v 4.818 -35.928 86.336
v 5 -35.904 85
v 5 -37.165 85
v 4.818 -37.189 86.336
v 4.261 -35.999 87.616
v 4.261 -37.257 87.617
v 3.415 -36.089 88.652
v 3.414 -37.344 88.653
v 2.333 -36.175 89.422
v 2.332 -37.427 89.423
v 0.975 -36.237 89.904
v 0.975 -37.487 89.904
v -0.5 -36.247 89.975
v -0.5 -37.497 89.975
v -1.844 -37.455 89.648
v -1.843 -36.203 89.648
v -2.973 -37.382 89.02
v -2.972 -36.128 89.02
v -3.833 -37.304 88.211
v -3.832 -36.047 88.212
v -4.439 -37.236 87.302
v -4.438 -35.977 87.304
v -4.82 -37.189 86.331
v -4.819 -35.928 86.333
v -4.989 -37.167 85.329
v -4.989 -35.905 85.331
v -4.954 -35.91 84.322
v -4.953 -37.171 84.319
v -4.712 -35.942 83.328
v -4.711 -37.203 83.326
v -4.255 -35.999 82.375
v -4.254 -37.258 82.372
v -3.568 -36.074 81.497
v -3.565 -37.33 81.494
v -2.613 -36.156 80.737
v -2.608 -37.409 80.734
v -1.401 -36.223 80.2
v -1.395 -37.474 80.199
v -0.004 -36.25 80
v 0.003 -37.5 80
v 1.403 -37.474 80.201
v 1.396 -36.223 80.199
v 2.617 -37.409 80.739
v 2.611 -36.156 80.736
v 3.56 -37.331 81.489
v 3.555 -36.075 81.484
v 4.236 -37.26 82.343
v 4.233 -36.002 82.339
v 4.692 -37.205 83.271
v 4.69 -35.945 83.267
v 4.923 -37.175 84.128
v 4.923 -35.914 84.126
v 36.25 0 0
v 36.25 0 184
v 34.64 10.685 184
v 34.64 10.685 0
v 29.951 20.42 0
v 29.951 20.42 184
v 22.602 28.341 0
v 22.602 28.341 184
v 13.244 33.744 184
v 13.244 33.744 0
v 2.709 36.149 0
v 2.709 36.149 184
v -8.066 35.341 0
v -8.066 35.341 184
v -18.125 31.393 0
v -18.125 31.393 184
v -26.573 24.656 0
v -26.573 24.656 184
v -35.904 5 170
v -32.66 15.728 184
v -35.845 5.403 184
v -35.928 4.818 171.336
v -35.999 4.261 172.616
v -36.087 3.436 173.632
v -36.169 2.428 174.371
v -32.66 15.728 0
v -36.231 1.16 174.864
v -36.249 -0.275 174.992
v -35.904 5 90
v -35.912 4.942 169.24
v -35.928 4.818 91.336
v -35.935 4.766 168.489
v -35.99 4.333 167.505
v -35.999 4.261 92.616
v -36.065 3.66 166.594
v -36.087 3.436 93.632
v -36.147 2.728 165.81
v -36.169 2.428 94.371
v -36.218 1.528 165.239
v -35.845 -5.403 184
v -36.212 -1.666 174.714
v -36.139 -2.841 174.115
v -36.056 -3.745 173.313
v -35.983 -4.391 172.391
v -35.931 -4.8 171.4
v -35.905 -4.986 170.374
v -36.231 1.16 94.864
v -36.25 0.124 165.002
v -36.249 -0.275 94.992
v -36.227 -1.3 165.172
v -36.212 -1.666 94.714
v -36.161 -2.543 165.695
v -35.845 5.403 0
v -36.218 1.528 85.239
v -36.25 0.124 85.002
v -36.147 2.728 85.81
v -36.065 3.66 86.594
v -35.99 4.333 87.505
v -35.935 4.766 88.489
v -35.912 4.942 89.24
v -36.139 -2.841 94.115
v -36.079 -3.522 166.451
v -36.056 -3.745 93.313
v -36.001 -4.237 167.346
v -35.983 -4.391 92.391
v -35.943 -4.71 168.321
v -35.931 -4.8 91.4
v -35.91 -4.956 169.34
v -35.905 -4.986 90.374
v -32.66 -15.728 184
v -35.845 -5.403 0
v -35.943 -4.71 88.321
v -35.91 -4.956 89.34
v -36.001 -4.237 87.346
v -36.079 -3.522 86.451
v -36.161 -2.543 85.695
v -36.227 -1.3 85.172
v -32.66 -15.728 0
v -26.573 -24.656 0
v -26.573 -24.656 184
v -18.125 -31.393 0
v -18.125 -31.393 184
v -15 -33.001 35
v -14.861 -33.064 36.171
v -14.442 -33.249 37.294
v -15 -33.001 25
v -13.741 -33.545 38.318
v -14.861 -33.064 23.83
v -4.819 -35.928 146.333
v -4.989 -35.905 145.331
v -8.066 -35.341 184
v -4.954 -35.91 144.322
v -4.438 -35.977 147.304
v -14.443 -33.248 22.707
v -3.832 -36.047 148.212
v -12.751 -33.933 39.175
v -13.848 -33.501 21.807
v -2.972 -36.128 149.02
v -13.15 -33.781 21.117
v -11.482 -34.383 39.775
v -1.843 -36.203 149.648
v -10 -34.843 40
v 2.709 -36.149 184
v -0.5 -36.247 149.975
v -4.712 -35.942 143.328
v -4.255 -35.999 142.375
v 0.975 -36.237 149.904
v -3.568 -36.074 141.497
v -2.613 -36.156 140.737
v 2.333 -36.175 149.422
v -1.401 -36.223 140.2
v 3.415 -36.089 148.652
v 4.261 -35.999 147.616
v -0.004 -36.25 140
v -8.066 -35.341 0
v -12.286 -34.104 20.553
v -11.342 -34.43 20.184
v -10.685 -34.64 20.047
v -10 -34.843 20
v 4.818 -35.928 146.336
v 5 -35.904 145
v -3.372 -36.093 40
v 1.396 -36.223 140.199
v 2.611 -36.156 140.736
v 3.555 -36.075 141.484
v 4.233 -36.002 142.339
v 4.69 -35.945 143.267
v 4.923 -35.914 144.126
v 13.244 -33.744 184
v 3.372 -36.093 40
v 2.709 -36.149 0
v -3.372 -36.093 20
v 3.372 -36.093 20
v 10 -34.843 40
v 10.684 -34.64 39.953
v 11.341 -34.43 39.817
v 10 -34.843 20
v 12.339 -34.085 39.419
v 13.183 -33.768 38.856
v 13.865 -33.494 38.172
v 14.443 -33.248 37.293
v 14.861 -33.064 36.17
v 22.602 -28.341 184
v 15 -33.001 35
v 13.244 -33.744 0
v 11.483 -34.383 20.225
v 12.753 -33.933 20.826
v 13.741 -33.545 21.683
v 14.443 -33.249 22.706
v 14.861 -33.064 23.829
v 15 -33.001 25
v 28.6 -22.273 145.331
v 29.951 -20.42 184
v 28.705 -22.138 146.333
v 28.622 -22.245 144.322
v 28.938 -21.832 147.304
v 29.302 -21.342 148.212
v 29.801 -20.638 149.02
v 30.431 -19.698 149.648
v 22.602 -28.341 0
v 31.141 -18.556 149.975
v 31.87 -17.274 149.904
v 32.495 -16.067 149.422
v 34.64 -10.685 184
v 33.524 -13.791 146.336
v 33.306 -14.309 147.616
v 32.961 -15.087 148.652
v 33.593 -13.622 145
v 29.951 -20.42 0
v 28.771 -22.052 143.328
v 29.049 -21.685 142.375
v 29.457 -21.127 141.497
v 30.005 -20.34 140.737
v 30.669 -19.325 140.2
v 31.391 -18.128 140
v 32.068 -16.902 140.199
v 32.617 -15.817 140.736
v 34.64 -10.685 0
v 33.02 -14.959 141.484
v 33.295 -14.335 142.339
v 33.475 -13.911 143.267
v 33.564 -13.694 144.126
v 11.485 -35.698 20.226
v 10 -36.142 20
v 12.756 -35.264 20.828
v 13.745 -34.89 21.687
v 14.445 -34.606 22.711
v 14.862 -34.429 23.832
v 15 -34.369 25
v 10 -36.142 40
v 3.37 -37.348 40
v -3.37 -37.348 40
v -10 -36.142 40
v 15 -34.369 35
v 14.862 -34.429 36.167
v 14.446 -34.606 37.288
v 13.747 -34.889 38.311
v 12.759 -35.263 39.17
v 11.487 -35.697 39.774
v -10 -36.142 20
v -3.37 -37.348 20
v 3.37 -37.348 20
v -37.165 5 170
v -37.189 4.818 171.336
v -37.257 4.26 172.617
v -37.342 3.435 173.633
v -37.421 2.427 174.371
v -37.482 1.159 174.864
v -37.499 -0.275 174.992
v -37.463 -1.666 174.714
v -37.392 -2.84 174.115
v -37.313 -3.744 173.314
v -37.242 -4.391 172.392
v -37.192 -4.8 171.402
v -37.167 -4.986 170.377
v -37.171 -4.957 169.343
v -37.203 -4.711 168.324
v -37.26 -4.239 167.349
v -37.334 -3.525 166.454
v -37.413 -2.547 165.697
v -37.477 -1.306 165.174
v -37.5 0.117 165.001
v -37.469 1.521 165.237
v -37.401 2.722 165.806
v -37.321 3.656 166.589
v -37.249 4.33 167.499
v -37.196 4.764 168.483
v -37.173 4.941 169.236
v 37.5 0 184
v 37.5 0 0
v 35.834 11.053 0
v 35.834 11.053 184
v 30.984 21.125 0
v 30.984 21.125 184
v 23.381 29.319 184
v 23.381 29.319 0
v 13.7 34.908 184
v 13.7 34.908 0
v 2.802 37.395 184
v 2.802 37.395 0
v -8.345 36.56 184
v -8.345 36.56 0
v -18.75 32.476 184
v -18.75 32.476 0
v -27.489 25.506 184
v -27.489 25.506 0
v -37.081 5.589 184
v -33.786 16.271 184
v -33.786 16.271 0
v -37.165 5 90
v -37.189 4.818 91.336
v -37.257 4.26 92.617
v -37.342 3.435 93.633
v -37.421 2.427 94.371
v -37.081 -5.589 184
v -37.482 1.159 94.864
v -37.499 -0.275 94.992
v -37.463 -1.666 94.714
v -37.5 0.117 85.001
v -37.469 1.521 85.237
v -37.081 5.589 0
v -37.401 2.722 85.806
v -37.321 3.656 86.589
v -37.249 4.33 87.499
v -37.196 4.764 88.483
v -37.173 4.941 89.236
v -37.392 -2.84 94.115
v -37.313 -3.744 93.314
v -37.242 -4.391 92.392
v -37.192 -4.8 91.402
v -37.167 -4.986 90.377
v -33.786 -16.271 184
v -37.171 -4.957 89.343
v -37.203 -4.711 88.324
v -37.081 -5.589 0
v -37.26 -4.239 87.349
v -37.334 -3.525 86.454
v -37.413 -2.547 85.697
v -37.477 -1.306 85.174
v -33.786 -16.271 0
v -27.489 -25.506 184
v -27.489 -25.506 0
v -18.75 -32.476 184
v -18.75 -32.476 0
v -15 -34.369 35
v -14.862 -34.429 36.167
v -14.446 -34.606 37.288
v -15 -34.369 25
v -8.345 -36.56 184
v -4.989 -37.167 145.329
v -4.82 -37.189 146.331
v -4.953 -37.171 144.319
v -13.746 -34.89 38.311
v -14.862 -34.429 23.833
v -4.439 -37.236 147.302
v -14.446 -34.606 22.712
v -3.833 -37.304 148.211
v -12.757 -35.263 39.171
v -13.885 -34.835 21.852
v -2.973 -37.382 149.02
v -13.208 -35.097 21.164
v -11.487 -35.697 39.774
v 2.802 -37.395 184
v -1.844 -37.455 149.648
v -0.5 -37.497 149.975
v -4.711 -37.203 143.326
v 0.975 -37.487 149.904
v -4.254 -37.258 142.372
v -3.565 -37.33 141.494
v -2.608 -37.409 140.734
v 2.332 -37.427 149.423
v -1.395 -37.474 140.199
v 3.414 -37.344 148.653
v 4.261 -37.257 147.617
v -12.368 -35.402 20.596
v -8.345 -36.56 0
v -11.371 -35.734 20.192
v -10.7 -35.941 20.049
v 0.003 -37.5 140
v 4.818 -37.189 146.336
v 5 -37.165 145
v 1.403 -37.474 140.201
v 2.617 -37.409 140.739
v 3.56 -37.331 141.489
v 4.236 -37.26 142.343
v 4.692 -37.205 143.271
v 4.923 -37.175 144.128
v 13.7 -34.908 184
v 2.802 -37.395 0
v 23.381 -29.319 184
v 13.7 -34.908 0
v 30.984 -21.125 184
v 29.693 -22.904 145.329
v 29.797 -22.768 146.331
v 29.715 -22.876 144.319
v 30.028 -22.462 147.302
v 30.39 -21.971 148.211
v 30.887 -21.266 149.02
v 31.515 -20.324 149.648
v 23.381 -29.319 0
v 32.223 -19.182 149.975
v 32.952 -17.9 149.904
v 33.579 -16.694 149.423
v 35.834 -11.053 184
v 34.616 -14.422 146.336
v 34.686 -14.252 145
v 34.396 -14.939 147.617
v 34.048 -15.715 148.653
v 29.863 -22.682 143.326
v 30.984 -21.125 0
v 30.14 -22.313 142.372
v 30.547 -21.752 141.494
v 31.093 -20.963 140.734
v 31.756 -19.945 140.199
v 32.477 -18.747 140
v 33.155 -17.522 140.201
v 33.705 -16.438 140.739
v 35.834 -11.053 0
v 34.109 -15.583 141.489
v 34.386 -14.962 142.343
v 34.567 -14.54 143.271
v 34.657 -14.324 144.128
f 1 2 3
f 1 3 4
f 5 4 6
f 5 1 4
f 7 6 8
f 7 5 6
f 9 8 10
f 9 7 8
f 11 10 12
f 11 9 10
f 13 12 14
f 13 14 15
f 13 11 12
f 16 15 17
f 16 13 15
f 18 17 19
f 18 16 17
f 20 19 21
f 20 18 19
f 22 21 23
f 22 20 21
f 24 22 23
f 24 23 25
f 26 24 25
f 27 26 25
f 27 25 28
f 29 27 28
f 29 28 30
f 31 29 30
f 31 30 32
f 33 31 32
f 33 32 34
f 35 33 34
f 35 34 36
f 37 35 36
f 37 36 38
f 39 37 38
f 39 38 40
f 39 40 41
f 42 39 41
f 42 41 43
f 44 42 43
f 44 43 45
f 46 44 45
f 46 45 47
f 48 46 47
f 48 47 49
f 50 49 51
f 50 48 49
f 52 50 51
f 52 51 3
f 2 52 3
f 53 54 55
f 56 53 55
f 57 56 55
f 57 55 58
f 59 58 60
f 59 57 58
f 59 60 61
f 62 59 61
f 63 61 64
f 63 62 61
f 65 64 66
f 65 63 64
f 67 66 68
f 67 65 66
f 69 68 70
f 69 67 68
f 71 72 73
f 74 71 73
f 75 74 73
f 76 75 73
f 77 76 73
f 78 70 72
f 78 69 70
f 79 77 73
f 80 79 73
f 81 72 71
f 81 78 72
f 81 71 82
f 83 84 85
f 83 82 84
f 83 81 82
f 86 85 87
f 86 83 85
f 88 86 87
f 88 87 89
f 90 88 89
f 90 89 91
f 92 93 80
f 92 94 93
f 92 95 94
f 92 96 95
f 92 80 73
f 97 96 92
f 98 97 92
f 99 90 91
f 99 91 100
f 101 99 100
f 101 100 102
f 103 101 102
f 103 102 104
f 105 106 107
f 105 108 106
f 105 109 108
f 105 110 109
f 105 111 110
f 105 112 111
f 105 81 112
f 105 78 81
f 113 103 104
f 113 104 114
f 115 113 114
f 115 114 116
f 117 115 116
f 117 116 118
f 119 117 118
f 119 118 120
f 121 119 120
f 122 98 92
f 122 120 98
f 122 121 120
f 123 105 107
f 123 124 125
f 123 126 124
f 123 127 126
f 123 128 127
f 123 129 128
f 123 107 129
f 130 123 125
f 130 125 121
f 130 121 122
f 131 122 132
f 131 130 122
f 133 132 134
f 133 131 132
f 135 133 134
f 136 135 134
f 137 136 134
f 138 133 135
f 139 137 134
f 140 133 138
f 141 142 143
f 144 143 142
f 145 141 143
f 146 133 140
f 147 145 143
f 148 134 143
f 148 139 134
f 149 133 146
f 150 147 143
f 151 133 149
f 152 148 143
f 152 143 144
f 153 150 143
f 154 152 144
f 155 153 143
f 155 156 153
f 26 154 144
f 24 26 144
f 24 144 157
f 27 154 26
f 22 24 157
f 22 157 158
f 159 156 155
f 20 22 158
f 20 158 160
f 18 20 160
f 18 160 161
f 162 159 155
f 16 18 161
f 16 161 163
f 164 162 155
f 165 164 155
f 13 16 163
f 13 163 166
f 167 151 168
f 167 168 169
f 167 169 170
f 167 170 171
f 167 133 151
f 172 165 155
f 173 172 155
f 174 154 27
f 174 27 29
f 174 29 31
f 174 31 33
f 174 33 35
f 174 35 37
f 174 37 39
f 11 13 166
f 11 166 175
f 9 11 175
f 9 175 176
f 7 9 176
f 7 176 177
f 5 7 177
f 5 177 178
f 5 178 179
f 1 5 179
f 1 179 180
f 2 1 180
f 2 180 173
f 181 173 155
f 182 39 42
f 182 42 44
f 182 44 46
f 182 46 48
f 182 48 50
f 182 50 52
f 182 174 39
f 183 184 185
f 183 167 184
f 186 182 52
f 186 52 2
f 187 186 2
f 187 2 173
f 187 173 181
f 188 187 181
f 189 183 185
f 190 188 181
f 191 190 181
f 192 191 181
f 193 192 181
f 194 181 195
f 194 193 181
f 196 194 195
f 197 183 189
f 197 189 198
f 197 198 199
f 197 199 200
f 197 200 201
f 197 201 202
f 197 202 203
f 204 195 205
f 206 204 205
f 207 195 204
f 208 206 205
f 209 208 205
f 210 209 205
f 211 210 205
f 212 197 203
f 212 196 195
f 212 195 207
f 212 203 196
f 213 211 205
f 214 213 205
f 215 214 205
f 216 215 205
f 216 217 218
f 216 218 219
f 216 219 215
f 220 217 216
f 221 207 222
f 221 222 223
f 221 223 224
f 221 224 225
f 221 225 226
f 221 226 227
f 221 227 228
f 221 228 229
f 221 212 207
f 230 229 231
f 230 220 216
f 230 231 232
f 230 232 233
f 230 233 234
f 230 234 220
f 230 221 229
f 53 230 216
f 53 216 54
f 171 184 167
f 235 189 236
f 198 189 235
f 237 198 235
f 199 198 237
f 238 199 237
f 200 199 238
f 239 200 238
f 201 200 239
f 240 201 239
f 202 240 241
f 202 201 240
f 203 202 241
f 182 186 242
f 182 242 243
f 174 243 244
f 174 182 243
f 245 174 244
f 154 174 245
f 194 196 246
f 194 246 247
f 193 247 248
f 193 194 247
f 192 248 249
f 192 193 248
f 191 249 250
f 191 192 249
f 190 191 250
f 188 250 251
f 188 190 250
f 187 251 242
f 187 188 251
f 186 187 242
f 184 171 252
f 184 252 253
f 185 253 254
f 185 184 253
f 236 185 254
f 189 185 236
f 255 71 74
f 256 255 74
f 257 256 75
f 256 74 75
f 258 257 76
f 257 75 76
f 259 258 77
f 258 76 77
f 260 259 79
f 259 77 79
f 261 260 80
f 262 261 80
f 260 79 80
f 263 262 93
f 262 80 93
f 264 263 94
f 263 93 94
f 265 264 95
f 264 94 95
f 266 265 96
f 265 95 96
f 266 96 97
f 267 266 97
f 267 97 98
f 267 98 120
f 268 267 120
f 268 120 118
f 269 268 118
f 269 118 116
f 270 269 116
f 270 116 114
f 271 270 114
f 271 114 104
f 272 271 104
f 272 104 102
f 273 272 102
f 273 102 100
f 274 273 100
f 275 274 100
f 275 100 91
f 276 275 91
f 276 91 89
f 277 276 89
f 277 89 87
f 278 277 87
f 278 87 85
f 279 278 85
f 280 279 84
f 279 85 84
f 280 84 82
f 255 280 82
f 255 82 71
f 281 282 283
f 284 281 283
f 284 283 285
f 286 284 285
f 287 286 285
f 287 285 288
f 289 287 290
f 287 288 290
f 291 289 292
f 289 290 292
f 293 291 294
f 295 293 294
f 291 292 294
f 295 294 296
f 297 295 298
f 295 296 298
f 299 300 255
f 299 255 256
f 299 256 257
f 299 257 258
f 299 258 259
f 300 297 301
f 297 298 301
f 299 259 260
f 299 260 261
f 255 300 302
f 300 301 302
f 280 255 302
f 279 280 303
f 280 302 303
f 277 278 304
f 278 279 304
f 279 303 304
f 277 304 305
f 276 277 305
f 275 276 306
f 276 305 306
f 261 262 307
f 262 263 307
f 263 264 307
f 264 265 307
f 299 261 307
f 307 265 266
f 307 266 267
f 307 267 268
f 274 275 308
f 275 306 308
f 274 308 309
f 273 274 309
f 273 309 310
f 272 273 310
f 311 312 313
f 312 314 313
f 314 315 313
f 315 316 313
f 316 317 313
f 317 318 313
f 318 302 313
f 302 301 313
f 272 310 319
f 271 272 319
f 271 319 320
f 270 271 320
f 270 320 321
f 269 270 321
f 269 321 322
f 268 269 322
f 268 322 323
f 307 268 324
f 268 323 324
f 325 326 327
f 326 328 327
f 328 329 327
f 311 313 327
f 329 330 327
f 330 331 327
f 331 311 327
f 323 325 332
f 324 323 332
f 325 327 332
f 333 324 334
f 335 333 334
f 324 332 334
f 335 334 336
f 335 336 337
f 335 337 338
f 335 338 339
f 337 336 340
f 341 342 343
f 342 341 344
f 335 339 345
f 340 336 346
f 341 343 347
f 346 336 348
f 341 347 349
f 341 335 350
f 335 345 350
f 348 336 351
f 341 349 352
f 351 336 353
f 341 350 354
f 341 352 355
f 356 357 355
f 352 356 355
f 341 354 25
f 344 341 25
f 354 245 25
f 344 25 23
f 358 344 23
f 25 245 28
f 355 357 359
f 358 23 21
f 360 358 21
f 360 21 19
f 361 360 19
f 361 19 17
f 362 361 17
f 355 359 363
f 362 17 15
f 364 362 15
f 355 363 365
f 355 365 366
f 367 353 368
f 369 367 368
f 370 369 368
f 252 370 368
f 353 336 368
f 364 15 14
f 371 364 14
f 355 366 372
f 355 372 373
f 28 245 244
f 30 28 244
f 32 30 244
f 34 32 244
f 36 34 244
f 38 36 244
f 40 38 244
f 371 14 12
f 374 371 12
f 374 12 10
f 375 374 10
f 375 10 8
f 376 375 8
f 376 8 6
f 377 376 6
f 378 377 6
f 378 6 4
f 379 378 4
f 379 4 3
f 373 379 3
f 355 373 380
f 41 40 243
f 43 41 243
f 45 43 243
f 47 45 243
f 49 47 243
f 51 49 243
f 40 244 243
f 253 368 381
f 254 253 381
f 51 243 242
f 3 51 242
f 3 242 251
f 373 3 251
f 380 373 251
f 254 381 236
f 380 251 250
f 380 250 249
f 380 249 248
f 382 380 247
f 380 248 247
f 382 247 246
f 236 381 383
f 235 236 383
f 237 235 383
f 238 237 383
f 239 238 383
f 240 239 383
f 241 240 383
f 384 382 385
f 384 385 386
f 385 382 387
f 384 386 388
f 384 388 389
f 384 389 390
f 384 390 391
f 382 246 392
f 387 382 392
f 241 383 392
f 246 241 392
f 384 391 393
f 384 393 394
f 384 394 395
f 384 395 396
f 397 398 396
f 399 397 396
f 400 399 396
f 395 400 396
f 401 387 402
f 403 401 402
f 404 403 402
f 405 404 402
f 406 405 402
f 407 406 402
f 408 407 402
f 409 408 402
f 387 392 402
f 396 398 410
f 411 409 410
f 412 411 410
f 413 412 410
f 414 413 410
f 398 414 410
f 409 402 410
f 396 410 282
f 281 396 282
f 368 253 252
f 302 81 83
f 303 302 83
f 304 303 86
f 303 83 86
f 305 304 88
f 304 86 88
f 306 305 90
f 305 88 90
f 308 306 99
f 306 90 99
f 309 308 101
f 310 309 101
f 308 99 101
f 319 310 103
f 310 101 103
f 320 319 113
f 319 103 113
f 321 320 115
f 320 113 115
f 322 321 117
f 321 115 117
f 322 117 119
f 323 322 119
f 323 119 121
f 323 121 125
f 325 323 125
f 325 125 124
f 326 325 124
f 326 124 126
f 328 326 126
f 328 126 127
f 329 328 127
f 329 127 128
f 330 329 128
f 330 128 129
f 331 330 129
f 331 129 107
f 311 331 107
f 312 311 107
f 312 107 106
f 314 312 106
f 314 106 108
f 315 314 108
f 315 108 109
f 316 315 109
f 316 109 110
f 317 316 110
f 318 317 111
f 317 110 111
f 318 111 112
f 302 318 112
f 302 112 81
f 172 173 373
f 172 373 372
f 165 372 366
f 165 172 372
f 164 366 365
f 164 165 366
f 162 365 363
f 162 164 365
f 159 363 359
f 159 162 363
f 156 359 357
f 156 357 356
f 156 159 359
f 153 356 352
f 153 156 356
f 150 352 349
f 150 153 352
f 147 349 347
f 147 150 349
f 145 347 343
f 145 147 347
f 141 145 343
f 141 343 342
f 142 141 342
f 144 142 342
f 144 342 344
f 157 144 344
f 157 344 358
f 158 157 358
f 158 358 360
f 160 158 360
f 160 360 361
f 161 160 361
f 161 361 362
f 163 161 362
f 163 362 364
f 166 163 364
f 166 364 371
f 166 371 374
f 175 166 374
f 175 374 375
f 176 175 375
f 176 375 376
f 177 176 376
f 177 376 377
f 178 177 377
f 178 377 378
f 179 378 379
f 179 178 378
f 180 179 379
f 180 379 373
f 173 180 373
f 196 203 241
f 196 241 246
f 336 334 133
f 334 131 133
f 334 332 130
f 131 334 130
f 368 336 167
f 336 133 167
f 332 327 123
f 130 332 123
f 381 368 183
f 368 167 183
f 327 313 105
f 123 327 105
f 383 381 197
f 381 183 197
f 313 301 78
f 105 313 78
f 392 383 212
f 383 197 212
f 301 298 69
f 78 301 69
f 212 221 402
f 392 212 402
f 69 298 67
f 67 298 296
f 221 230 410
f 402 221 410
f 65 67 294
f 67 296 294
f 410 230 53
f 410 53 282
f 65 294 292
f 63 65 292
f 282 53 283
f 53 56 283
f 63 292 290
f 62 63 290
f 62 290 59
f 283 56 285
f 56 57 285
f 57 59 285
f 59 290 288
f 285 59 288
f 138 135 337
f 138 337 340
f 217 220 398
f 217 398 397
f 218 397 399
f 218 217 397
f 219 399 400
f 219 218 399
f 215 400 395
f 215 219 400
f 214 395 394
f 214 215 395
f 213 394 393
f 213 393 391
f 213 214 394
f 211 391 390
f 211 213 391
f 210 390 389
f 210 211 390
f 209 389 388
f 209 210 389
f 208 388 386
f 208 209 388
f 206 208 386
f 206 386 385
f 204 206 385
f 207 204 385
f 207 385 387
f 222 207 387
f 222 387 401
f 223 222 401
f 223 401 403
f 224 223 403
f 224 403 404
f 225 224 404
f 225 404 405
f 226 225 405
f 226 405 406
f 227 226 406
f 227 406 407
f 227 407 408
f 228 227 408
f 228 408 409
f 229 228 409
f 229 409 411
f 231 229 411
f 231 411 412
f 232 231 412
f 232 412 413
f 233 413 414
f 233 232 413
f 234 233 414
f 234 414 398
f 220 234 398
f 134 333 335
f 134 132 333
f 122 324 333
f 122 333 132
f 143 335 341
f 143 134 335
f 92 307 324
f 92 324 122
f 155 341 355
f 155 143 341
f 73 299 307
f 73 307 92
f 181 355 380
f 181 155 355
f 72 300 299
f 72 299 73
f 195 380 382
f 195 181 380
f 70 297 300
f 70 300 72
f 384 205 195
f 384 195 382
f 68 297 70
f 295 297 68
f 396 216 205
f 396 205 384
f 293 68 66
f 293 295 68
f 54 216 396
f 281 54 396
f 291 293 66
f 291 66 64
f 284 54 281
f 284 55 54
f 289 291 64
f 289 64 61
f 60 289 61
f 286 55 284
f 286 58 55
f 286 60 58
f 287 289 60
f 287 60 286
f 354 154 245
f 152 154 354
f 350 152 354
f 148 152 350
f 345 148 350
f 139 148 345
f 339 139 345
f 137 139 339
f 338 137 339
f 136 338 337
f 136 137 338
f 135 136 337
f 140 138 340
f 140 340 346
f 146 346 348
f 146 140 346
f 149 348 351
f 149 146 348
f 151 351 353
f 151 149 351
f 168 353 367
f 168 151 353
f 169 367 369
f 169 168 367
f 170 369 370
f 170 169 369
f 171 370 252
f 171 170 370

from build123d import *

# Parameters (mm, degrees)
F0_R          = 37.5
F0_R_2        = 36.25
F1_DEPTH      = 184
F2_R          = 5
F3_DEPTH      = 50
F4_R          = 5
F5_DEPTH      = 70
F5_DEPTH_BACK = 25
F7_DEPTH      = 70
F8_R          = 5
F9_DEPTH      = 60
F12_R         = 5
F13_DEPTH     = 100


with BuildPart() as f1:
    # F0 (on Top) → F1 (new body)
    with BuildSketch(Plane.XY):
        Circle(F0_R)
        Circle(F0_R_2, mode=Mode.SUBTRACT)
    extrude(amount=F1_DEPTH)

    # F2 (on Right) → F3 (cut)
    with BuildSketch(Plane.YZ):
        with Locations((0, 170)):
            Circle(F2_R)
    extrude(amount=-F3_DEPTH, mode=Mode.SUBTRACT)

    # F4 (on Front) → F5 (cut, two sides)
    with BuildSketch(Plane.XZ) as f5_sk:
        with Locations((0, 85)):
            Circle(F4_R)
        with Locations((0, 145)):
            Circle(F4_R)
    extrude(amount=F5_DEPTH, mode=Mode.SUBTRACT)
    extrude(f5_sk.sketch, amount=-F5_DEPTH_BACK, mode=Mode.SUBTRACT)

    # F6 (on Front) → F7 (cut)
    with BuildSketch(Plane.XZ):
        with BuildLine():
            Line((-10, 20), (10, 20))
            ThreePointArc((10, 20), (13.535534, 21.464466), (15, 25))
            Line((15, 25), (15, 35))
            ThreePointArc((15, 35), (13.535534, 38.535534), (10, 40))
            Line((10, 40), (-10, 40))
            ThreePointArc((-10, 40), (-13.535534, 38.535534), (-15, 35))
            Line((-15, 35), (-15, 25))
            ThreePointArc((-15, 25), (-13.535534, 21.464466), (-10, 20))
        make_face()
    extrude(amount=F7_DEPTH, mode=Mode.SUBTRACT)

    # F8 (on Right) → F9 (cut)
    with BuildSketch(Plane.YZ):
        with Locations((0, 90)):
            Circle(F8_R)
    extrude(amount=-F9_DEPTH, mode=Mode.SUBTRACT)

    # F12 (on face) → F13 (cut)
    with BuildSketch(Plane(origin=(0, 0, 0), x_dir=(0.5, 0.866025, 0), z_dir=(0.866025, -0.5, 0))):
        with Locations((0, 145)):
            Circle(F12_R)
    extrude(amount=F13_DEPTH, mode=Mode.SUBTRACT)


solid = f1.part
